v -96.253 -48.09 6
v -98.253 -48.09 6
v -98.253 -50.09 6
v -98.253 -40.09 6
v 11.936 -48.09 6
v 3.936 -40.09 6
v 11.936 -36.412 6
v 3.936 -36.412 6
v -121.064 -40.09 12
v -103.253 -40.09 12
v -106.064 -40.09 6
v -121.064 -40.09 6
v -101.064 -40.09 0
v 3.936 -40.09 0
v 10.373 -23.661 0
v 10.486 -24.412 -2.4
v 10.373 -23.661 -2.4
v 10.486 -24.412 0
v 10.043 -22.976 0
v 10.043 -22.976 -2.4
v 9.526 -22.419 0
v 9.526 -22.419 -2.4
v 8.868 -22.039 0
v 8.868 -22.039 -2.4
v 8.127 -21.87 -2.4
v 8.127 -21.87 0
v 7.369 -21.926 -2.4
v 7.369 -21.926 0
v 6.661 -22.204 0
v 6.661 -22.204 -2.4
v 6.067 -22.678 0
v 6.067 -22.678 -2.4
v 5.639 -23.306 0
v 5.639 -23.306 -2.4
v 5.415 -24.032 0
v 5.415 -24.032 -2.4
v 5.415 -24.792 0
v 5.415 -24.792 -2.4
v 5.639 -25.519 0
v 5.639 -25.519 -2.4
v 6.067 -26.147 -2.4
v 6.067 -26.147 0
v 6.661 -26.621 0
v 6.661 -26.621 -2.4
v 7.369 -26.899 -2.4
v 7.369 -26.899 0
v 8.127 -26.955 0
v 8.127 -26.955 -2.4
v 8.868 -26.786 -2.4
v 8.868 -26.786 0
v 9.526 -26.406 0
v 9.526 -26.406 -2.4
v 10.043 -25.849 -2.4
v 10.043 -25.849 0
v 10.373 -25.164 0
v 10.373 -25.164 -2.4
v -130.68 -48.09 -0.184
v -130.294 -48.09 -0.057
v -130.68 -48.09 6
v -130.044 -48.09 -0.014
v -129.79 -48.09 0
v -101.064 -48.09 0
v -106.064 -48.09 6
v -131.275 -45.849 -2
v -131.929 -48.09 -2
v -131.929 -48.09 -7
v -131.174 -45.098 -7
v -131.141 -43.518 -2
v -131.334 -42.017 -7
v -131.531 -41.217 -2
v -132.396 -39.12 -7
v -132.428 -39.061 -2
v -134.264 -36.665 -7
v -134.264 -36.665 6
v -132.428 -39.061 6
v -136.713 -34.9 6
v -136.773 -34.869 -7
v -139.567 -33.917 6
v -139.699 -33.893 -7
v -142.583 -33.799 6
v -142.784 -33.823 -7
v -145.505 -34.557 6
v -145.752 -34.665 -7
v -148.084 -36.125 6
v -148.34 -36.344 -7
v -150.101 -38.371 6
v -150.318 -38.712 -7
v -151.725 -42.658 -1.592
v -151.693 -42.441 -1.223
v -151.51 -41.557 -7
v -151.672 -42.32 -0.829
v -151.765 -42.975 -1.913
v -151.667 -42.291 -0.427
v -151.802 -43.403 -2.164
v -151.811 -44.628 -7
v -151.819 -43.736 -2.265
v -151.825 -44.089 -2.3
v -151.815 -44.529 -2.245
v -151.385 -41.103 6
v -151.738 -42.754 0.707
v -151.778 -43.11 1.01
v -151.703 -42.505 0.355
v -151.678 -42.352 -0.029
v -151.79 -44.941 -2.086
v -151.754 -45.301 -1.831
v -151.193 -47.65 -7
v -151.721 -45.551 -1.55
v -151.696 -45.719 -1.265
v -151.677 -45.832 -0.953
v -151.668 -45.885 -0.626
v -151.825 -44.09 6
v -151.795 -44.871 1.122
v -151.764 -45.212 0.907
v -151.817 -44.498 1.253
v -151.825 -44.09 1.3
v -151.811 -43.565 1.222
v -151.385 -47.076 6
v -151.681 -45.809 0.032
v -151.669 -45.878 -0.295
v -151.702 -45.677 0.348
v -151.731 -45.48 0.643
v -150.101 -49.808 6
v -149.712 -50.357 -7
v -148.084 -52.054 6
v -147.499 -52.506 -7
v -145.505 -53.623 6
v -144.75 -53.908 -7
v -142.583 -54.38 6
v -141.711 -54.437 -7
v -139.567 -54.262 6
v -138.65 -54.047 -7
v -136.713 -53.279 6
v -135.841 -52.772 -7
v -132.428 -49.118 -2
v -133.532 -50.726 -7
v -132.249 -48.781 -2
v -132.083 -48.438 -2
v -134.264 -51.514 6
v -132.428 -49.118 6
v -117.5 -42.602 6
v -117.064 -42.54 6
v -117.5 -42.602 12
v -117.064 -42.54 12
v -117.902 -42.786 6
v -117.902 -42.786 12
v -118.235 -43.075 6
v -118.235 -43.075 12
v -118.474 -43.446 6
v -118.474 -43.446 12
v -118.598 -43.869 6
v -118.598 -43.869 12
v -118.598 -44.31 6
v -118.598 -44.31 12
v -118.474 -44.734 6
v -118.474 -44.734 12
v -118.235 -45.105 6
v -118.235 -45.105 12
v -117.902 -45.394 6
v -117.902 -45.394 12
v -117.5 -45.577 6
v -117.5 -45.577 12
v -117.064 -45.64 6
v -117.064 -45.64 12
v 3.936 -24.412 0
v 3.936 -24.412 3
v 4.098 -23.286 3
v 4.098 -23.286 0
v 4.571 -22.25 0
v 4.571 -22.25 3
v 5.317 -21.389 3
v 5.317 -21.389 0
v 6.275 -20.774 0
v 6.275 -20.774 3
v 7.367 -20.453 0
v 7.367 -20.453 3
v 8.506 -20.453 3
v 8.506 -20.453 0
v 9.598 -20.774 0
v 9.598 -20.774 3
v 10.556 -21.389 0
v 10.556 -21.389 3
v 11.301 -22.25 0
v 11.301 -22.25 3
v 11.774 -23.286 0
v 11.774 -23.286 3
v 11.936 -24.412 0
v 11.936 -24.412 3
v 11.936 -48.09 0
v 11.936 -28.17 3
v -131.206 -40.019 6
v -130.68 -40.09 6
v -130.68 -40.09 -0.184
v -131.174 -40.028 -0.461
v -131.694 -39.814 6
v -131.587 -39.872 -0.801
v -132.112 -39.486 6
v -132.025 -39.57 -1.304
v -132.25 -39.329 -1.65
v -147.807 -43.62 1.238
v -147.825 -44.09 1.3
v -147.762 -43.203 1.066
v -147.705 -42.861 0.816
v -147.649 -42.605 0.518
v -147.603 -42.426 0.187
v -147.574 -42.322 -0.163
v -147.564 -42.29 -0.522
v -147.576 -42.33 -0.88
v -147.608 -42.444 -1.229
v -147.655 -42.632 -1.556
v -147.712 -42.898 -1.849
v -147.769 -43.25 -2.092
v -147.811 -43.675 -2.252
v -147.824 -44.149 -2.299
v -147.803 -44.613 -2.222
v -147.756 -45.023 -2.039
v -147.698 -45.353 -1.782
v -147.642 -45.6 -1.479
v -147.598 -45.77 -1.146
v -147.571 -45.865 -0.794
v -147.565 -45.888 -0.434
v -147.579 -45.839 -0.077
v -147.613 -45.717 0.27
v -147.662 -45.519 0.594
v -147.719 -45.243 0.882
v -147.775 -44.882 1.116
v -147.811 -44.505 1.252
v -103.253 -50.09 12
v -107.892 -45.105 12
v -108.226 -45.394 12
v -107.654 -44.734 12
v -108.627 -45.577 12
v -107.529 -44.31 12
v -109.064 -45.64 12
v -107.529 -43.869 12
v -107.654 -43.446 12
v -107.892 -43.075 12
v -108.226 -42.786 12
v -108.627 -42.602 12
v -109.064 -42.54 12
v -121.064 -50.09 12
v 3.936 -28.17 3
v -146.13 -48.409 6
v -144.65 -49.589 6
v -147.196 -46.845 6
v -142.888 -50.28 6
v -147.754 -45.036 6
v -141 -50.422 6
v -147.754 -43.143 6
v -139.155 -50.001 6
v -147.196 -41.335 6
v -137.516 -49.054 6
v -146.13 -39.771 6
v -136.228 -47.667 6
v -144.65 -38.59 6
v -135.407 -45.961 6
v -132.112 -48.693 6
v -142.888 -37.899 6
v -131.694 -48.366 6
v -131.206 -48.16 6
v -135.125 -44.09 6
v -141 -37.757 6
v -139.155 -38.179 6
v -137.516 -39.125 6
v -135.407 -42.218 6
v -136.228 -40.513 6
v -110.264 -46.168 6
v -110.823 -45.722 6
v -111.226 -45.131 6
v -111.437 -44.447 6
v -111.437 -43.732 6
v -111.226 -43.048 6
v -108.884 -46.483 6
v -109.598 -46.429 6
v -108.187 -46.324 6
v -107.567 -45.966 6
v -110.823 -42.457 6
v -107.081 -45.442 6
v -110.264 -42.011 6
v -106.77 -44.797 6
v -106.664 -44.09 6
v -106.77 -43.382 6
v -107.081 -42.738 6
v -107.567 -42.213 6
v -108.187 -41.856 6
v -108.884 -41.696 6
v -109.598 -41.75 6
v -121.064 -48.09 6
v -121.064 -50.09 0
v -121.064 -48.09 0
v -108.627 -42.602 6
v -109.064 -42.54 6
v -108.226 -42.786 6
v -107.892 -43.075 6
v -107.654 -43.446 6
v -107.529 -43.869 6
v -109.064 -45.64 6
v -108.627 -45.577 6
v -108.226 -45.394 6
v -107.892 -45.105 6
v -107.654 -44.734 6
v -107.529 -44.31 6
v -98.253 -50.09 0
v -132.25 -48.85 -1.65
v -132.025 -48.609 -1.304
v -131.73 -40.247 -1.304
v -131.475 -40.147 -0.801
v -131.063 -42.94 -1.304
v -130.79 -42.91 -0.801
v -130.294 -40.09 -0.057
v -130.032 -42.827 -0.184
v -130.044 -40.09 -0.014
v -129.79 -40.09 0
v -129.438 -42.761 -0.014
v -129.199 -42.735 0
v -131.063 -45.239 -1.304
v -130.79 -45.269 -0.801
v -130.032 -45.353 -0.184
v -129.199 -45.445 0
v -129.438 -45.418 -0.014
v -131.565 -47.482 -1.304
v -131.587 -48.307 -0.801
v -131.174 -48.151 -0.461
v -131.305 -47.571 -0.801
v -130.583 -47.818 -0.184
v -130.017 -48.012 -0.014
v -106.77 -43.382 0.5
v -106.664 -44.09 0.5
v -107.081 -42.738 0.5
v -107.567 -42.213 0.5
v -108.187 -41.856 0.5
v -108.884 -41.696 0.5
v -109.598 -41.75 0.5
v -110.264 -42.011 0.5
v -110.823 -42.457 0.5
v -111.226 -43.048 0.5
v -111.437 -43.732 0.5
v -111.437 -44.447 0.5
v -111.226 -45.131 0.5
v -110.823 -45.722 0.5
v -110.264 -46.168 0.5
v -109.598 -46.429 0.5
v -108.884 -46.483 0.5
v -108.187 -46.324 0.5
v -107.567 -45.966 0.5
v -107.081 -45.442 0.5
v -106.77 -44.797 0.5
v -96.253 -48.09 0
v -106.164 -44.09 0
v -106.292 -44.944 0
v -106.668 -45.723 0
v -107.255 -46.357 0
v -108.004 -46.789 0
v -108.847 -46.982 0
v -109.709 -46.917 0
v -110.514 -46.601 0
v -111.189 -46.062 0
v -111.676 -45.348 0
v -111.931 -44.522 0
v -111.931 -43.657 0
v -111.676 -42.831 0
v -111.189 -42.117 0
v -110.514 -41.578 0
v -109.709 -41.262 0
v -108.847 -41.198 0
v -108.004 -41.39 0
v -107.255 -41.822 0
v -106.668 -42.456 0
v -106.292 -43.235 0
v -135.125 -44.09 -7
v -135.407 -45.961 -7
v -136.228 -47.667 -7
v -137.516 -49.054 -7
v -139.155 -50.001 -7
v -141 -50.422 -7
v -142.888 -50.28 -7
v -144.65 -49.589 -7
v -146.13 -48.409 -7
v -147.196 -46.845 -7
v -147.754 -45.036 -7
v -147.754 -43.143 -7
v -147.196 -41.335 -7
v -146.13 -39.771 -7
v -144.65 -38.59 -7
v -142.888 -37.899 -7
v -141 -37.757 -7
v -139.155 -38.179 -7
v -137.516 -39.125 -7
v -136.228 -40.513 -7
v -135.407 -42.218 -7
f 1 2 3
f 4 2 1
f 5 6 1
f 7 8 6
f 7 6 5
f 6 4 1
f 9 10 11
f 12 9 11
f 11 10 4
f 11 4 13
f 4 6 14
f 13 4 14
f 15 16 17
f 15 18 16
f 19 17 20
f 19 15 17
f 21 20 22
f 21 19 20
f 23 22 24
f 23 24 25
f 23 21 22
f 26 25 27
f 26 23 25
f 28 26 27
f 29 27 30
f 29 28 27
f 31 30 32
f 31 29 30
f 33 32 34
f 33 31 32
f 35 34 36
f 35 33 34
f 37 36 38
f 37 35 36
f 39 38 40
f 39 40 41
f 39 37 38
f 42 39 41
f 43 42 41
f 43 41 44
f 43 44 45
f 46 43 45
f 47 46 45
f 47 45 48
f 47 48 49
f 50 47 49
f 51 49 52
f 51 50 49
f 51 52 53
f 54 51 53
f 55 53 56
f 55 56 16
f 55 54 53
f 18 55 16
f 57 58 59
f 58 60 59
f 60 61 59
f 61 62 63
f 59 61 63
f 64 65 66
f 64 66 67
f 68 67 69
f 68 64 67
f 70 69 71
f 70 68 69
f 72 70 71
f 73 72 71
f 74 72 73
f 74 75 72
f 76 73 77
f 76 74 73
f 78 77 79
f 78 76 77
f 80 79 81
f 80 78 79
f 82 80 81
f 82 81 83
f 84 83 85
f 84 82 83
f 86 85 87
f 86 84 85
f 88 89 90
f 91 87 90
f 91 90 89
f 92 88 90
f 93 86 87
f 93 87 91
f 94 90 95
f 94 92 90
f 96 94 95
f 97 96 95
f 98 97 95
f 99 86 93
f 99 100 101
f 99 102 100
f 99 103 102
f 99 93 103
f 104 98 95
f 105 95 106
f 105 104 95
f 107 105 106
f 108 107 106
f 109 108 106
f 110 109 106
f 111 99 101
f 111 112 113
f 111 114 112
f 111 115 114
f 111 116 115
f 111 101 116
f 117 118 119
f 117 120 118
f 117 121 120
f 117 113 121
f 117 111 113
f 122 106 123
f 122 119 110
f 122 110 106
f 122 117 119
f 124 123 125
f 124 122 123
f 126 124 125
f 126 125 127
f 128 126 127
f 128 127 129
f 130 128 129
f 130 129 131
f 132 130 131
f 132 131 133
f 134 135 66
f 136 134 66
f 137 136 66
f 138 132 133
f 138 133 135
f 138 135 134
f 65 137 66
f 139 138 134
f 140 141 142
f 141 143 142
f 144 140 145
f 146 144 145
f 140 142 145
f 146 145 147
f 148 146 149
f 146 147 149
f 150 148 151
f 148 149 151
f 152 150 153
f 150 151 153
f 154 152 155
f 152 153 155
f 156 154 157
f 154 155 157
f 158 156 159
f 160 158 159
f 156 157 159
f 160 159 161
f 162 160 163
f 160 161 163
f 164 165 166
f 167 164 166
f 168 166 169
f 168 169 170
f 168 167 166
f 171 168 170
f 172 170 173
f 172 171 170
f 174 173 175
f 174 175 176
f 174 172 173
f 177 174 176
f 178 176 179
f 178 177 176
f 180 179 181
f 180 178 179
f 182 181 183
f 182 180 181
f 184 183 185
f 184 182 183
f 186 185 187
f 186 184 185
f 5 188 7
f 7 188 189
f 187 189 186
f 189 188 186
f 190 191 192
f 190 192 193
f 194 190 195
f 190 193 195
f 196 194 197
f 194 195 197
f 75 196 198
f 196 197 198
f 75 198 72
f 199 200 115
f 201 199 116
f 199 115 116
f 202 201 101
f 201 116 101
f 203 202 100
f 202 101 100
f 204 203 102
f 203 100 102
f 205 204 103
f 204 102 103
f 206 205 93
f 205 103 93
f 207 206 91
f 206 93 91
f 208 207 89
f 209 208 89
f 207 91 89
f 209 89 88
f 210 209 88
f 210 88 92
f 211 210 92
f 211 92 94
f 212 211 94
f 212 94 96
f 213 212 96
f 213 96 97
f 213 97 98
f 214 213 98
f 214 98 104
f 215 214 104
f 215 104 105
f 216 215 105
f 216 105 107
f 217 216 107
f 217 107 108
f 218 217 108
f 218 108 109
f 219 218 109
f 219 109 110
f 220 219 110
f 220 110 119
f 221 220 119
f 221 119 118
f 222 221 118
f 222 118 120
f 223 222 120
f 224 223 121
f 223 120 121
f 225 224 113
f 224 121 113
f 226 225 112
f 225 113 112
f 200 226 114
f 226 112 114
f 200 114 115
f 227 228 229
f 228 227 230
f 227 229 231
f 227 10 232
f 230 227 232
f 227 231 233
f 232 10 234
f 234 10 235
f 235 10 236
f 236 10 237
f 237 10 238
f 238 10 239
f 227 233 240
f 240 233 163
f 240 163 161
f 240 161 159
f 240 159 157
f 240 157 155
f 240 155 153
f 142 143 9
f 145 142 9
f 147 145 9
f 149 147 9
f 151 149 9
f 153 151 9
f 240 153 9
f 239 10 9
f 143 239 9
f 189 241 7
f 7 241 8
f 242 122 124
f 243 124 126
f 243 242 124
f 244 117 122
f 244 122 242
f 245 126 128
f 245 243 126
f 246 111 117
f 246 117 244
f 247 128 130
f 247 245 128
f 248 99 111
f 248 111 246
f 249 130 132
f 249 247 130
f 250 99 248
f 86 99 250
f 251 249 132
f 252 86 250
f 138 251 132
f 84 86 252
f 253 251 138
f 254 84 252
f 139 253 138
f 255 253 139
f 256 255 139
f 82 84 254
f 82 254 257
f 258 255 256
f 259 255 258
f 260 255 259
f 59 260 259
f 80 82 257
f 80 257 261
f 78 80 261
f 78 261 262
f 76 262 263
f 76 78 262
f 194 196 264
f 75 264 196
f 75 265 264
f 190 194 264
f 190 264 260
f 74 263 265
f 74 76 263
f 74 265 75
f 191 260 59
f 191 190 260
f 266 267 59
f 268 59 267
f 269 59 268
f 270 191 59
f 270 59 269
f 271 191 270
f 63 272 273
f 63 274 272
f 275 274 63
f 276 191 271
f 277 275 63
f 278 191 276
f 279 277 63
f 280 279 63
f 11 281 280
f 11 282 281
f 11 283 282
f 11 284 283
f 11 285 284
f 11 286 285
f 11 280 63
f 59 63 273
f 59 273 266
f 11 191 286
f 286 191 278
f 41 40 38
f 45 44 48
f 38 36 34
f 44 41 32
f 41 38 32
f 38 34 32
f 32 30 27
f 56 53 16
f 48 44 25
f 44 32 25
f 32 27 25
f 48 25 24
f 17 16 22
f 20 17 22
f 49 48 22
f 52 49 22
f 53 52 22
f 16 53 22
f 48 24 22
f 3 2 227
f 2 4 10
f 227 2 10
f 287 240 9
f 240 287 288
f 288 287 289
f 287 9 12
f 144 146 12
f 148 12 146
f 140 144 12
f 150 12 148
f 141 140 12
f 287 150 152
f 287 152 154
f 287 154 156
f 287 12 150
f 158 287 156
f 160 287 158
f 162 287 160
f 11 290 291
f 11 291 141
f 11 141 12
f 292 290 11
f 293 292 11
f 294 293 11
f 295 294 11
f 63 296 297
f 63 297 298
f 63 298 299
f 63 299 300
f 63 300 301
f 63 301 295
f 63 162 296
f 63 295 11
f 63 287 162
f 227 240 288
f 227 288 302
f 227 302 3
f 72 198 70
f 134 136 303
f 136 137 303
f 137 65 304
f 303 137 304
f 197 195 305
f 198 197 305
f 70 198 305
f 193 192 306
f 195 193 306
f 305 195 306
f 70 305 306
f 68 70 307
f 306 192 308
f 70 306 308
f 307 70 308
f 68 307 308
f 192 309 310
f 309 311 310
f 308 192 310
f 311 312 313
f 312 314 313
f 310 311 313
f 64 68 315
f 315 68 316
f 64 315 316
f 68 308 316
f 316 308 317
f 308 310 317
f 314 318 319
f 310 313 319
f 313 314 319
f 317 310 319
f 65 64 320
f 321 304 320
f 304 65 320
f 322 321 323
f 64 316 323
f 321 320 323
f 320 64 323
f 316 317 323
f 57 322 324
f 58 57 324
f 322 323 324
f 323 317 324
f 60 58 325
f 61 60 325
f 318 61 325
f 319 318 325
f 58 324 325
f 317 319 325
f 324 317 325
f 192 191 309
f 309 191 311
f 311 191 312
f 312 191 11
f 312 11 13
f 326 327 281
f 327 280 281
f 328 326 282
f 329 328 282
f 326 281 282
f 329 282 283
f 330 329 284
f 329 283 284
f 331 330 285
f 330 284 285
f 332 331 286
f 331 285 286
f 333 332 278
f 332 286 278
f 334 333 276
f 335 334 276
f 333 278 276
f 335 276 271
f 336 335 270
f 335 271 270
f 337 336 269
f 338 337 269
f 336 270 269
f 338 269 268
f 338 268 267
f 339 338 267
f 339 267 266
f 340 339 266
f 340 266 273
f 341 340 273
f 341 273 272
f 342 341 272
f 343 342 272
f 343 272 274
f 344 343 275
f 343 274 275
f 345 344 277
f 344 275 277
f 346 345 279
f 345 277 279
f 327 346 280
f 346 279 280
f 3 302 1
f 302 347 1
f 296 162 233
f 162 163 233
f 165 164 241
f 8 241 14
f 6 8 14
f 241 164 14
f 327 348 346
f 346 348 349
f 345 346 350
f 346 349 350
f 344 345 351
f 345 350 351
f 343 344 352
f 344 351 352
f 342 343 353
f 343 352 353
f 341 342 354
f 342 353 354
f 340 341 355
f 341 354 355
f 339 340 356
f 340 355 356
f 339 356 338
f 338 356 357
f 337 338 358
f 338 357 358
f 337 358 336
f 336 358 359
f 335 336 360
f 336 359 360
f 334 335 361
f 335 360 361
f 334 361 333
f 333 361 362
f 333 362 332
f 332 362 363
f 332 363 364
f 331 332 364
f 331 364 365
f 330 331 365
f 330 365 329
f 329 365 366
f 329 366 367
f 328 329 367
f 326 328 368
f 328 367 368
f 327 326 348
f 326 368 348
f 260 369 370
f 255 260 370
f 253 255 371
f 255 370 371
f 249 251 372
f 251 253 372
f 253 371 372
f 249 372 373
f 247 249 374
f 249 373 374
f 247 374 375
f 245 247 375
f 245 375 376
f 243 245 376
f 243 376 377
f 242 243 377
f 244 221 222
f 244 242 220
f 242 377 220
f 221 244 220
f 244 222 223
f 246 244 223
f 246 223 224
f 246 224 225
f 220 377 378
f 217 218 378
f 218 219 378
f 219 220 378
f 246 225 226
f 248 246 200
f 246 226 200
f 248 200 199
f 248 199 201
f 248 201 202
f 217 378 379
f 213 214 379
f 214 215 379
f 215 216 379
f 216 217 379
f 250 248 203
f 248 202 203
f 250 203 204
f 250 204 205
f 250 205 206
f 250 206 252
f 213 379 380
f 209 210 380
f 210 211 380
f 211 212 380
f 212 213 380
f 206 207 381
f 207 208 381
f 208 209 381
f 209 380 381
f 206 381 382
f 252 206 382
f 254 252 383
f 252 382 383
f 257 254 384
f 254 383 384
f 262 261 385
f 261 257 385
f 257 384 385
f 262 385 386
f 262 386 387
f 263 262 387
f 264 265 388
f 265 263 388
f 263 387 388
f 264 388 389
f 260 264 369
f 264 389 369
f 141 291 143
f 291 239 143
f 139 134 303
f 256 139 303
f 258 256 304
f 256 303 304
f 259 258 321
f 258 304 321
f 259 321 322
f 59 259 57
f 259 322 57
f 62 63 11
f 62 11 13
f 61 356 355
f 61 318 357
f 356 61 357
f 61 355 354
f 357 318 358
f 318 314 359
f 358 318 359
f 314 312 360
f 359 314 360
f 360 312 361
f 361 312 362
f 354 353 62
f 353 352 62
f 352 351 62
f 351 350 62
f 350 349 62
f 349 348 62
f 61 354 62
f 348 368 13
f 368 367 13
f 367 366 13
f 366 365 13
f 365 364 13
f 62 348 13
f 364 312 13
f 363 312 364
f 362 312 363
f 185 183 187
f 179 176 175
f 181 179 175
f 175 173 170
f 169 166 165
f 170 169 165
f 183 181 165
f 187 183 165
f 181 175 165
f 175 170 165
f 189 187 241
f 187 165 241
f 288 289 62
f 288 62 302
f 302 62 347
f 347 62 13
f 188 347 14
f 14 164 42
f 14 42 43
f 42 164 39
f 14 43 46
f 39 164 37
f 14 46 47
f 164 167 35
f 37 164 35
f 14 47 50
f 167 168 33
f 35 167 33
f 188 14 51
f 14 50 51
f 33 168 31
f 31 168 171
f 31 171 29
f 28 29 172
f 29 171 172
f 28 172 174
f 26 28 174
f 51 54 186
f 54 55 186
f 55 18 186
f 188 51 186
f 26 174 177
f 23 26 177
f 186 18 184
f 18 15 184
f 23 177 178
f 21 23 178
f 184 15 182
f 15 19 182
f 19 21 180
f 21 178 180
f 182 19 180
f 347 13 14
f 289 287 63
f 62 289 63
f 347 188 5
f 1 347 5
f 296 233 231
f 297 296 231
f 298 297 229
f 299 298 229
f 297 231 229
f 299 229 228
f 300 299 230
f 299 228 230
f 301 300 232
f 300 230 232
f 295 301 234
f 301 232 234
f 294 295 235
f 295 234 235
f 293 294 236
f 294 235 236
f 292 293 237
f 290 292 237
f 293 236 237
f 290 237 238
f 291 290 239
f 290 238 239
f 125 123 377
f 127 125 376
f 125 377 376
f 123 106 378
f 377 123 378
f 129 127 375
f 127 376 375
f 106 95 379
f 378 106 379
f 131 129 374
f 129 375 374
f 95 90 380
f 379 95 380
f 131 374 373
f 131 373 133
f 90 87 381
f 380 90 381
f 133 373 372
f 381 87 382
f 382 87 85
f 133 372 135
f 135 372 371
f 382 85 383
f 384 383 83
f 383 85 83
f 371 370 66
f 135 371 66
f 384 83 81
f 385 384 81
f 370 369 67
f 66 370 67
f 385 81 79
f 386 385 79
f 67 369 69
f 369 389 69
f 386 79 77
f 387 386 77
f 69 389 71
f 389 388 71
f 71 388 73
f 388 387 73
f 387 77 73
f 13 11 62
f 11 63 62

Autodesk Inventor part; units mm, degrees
ref_plane "YZ Plane" through (0, 0, 0) normal (1, 0, 0) x (0, 1, 0)
sketch "Sketch1" plane through (0, 0, 0) normal (0, 0, 1) x (1, 0, 0)
  circle A0 centre (7.936401, -24.412437) radius 2.575 construction
  circle A1 centre (7.936401, -24.412437) radius 2.55
  dimension "d70" = 5.1
sketch "Sketch1 outline for Extrusion1" plane through (0, 0, 0) normal (0, 0, 1) x (1, 0, 0)
  circle A0 centre (7.936401, -24.412437) radius 2.55
extrude "Extrusion1" add sketch "Sketch1 outline for Extrusion1" against normal blind 2.4
sketch "Sketch2" plane through (0, 0, 0) normal (0, 0, 1) x (1, 0, 0)
  arc A0 (11.936401, -24.412437) -> (3.936401, -24.412437) centre (7.936401, -24.412437) ccw
  line L0 (11.936401, -24.412437) -> (3.936401, -24.412437) construction
  line L1 (3.936401, -24.412437) -> (3.936401, -40.089664)
  line L2 (11.936401, -48.089664) -> (11.936401, -24.412437)
  line L3 (-141.474726, -48.126865) -> (-141.474726, -40.126865) construction
  line L4 (-131.928915, -40.089664) -> (3.936401, -40.089664)
  arc A1 (-131.928915, -40.089664) -> (-131.928915, -48.089664) centre (-141.474726, -44.089664) ccw
  line L5 (11.936401, -48.089664) -> (-131.928915, -48.089664)
  circle A2 centre (-141.474726, -44.089664) radius 6.35
  line L6 (-118.52781, -40.089664) -> (-118.52781, -48.089664) construction
  circle A3 centre (-141.474726, -44.089664) radius 5.8293
  circle A4 centre (7.936401, -24.412437) radius 2.55
  point P0 (-118.52781, -44.089664)
  point P1 (12.740451, -19.012437)
  dimension "d3" = 8
  dimension "d36" = 12.7
  dimension "d37" = 4
  dimension "d38" = 8
sketch "Sketch2 outline for Extrusion2" plane through (0, 0, 0) normal (0, 0, 1) x (1, 0, 0)
  line L0 (11.936401, -48.089664) -> (11.936401, -24.412437)
  line L1 (-131.928915, -48.089664) -> (11.936401, -48.089664)
  arc A0 (11.936401, -24.412437) -> (3.936401, -24.412437) centre (7.936401, -24.412437) ccw
  arc A1 (-131.928915, -40.089664) -> (-131.928915, -48.089664) centre (-141.474726, -44.089664) ccw
  line L2 (3.936401, -24.412437) -> (3.936401, -40.089664)
  line L3 (3.936401, -40.089664) -> (-131.928915, -40.089664)
  circle A2 centre (-141.474726, -44.089664) radius 6.35
extrude "Extrusion2" add sketch "Sketch2 outline for Extrusion2" along normal blind 6
sketch "Sketch3" plane through (3.936401, -40.089664, 0) normal (-1, 0, 0) x (0, 0, 1)
  line L0 (0, 19.677227) -> (6, 19.677227)
  line L1 (3, 19.677227) -> (3, 11.919659)
  line L2 (3, 11.919659) -> (6, 3.677227)
  line L3 (6, 15.677227) -> (6, 19.677227)
  line L4 (6, 15.677227) -> (6, 0)
  point P0 (0, 40.089664)
  point P1 (5, 8)
  dimension "d8" = 160
  dimension "d10" = 16
sketch "Sketch3 outline for Extrusion3" plane through (3.936401, -40.089664, 0) normal (-1, 0, 0) x (0, 0, 1)
  line L0 (6, 15.677227) -> (6, 19.677227)
  line L1 (6, 3.677227) -> (6, 15.677227)
  line L2 (3, 11.919659) -> (6, 3.677227)
  line L3 (3, 19.677227) -> (3, 11.919659)
  line L4 (6, 19.677227) -> (3, 19.677227)
extrude "Extrusion3" cut sketch "Sketch3 outline for Extrusion3" against normal through all
ref_plane "Work Plane3" through (-155.900182, -65.296024, -7) normal (0, 0, 1) x (1, 0, 0)
sketch "Sketch8" plane through (-124.033402, -23.677227, 0) normal (0, 0, 1) x (1, 0, 0)
  arc A0 (-7.895513, -16.412437) -> (-7.895513, -24.412437) centre (-17.441324, -20.412437) ccw
  circle A1 centre (-17.441324, -20.412437) radius 6.35
  circle A2 centre (-17.441324, -20.412437) radius 10.35
  point P0 (124.033402, 23.677227)
  point P1 (-7.895513, -24.412437)
  point P2 (-7.895513, -16.412437)
sketch "Sketch8 outline for Extrusion8" plane through (-124.033402, -23.677227, 0) normal (0, 0, 1) x (1, 0, 0)
  arc A0 (-7.895513, -24.412437) -> (-7.895513, -16.412437) centre (-17.441324, -20.412437) ccw
  arc A1 (-7.895513, -16.412437) -> (-7.895513, -24.412437) centre (-17.441324, -20.412437) ccw
  circle A2 centre (-17.441324, -20.412437) radius 6.35
extrude "Extrusion8" add sketch "Sketch8 outline for Extrusion8" against normal up to surface (7 mm away)
fillet "Fillet1" radius 2 3 edges at (-131.1247, -44.0897, 0) (-131.9289, -48.0897, 3) (-131.9289, -40.0897, 3)
ref_plane "Work Plane2" through (-151.824726, -44.089664, 0) normal (-1, 0, 0) x (0, 0, 1)
sketch "Sketch9" plane through (-151.824726, -44.089664, 0) normal (-1, 0, 0) x (0, 0, 1)
  circle A0 centre (-0.5, 0) radius 1.8
  line L0 (6, -10.35) -> (6, 10.35) projected
  point P0 (0, 44.089664)
  point P1 (6, 5.02834)
  point P2 (6, -5.02834)
  point P3 (6, 0)
  dimension "d31" = 3.6
  dimension "d41" = 6.5
sketch "Sketch9 outline for Extrusion9" plane through (-151.824726, -44.089664, 0) normal (-1, 0, 0) x (0, 0, 1)
  circle A0 centre (-0.5, 0) radius 1.8
extrude "Extrusion9" cut sketch "Sketch9 outline for Extrusion9" against normal up to next
sketch "Sketch10" plane through (11.936401, -48.089664, 0) normal (0, -1, 0) x (1, 0, 0)
  line L0 (-8, 6) -> (-142.616568, 6)
  line L1 (-118, 6) -> (-113, 0)
  line L2 (-8, 0) -> (-141.726842, 0)
  point P0 (-11.936401, 0)
  point P1 (-142.616879, 0)
  point P2 (-143.760295, 0)
surface extrude "ExtrusionSrf1" sketch "Sketch10" against normal through all shown no curves L1
split body "Split1" result two bodies by surface "ExtrusionSrf1" first body at (-134.013926, -50.520758, -1)
sketch "Sketch11" plane through (11.936401, -48.089664, 0) normal (0, -1, 0) x (1, 0, 0)
  line L0 (-8, 6) -> (-118, 6)
  line L1 (-110.18975, 6) -> (-115.18975, 12)
  line L2 (-110.18975, 6) -> (-102.379501, 6) construction
  line L3 (-115.18975, 12) -> (-133, 12)
  line L4 (-133, 12) -> (-133, 6)
  line L5 (-142.616568, 6) -> (-118, 6)
  line L6 (-133, 6) -> (-118, 6)
  line L7 (-118, 6) -> (-113, 0)
  line L8 (-118, 6) -> (-110.18975, 6)
  line L9 (-113, 0) -> (-141.726842, 0)
  line L10 (-113, 0) -> (0, 0)
  point P0 (-11.936401, 0)
  point P1 (-142.616879, 0)
  point P2 (-143.760295, 0)
  dimension "d47" = 6
  dimension "d48" = 6
  dimension "d49" = 15
  dimension "d64" = 6
sketch "Sketch11 outline for Extrusion10" plane through (11.936401, -48.089664, 0) normal (0, -1, 0) x (1, 0, 0)
  line L0 (-115.18975, 12) -> (-133, 12)
  line L1 (-110.18975, 6) -> (-115.18975, 12)
  line L2 (-118, 6) -> (-110.18975, 6)
  line L3 (-133, 6) -> (-118, 6)
  line L4 (-133, 12) -> (-133, 6)
extrude "Extrusion10" add sketch "Sketch11 outline for Extrusion10" against normal up to surface (8 mm away) bodies 3
sketch "Sketch12" plane through (-121.063599, -48.089664, 12) normal (0, 0, 1) x (1, 0, 0)
  line L0 (4, 4) -> (12, 4) construction
  line L1 (4, 2.45) -> (12, 2.45)
  line L2 (12, 5.55) -> (4, 5.55)
  arc A0 (4, 5.55) -> (4, 2.45) centre (4, 4) ccw
  arc A1 (12, 2.45) -> (12, 5.55) centre (12, 4) ccw
  line L3 (0, 0) -> (0, 8)
  line L4 (17.81025, 0) -> (17.81025, 8)
  point P0 (121.063599, 48.089664)
  point P1 (8, 4)
  point P2 (0, 4)
  dimension "d52" = 8
  dimension "d53" = 3.1
  dimension "d54" = 4
sketch "Sketch12 outline for Extrusion11" plane through (-121.063599, -48.089664, 12) normal (0, 0, 1) x (1, 0, 0)
  line L0 (4, 2.45) -> (12, 2.45)
  arc A0 (4, 5.55) -> (4, 2.45) centre (4, 4) ccw
  line L1 (12, 5.55) -> (4, 5.55)
  arc A1 (12, 2.45) -> (12, 5.55) centre (12, 4) ccw
extrude "Extrusion11" cut sketch "Sketch12 outline for Extrusion11" against normal through all bodies 3
sketch "Sketch13" plane through (0, 0, 6) normal (0, 0, 1) x (1, 0, 0)
  arc A0 (-109.063599, -45.639664) -> (-109.063599, -42.539664) centre (-109.063599, -44.089664) ccw
  circle A1 centre (-109.063599, -44.089664) radius 2.4
  point P0 (0, 0)
  dimension "d58" = 4.8
sketch "Sketch13 outline for Extrusion12" plane through (0, 0, 6) normal (0, 0, 1) x (1, 0, 0)
  circle A0 centre (-109.063599, -44.089664) radius 2.4
extrude "Extrusion12" cut sketch "Sketch13 outline for Extrusion12" against normal through all bodies 2
chamfer "Chamfer1" distance 0.5 angle 45 1 edges at (-111.4636, -44.0897, 0)
sketch "Sketch14" plane through (11.936401, -48.089664, 0) normal (0, -1, 0) x (1, 0, 0)
  line L0 (-115.18975, 12) -> (-133, 12)
  line L1 (-133, 12) -> (-115.18975, 12)
  line L2 (-133, 0) -> (-133, 12)
  line L3 (-110.18975, 6) -> (-115.18975, 12)
  line L4 (-115.18975, 12) -> (-110.18975, 6)
  line L5 (-110.18975, 0) -> (-110.18975, 6)
  line L6 (-141.726842, 0) -> (-113, 0)
  line L7 (-133, 0) -> (-110.18975, 0)
  point P0 (-11.936401, 0)
  point P1 (-142.616879, 0)
  point P2 (-143.760295, 0)
sketch "Sketch14 outline for Extrusion13" plane through (11.936401, -48.089664, 0) normal (0, -1, 0) x (1, 0, 0)
  line L0 (-110.18975, 0) -> (-110.18975, 6)
  line L1 (-133, 0) -> (-110.18975, 0)
  line L2 (-133, 12) -> (-133, 0)
  line L3 (-115.18975, 12) -> (-133, 12)
  line L4 (-110.18975, 6) -> (-115.18975, 12)
extrude "Extrusion13" add sketch "Sketch14 outline for Extrusion13" along normal blind 2 bodies 3
chamfer "Chamfer2" distance 2 angle 45 1 edges at (-98.2533, -48.0897, 3)
equation "\"d47\" = d64"
equation "\"d48\" = d47"
properties part number "head_lock_2"
